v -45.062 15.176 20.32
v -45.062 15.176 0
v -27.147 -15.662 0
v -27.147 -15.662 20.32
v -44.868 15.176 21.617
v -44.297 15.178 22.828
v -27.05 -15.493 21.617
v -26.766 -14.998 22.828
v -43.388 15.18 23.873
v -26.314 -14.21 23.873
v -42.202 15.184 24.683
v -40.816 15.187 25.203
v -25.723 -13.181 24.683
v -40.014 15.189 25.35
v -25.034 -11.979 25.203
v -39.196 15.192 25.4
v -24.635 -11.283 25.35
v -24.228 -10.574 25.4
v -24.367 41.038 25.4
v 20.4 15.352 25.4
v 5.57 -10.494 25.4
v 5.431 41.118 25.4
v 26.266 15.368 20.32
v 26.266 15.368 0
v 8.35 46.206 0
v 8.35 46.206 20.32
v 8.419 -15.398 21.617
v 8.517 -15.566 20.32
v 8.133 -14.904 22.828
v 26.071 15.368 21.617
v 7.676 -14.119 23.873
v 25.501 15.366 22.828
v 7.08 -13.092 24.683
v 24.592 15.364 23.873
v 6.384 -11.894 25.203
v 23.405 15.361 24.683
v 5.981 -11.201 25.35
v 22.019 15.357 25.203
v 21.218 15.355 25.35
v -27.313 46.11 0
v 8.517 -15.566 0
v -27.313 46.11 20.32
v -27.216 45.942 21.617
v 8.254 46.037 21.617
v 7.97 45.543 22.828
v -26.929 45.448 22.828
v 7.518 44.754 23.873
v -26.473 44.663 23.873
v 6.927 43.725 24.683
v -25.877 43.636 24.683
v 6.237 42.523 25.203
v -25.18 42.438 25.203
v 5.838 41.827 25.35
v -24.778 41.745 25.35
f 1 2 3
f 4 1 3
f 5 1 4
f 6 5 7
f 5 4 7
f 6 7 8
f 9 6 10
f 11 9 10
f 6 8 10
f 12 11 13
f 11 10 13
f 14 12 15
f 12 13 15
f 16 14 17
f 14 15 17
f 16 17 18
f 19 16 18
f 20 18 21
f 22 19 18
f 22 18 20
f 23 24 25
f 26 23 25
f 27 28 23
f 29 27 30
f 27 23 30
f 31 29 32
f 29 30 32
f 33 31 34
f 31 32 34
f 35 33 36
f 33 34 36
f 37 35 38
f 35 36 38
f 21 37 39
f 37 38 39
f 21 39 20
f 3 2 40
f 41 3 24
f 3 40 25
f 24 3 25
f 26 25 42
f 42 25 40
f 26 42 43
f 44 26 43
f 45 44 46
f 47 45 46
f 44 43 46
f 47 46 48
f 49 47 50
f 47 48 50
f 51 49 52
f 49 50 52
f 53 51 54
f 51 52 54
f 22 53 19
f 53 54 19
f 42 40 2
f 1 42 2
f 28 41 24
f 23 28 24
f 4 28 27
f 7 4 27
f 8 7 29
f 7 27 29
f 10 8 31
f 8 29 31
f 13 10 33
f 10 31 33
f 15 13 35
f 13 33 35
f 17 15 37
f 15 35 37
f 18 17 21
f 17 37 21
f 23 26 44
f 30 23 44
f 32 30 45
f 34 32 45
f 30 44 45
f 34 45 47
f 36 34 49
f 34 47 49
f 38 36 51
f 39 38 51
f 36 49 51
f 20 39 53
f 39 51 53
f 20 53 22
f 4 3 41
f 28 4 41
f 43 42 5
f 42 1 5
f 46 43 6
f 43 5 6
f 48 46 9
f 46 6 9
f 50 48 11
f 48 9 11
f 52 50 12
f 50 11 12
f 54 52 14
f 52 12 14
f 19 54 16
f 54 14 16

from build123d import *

# Parameters (mm, degrees)
F1_DEPTH = 25.4
F2_R     = 5.08


with BuildPart() as f1:
    # F0 (on Top) → F1 (new body)
    with BuildSketch(Plane.XY):
        Polygon((-27.146846, -15.661945), (8.517105, -15.565745), (26.265768, 15.368244), (8.35048, 46.206031), (-27.313471, 46.10983), (-45.062134, 15.175842), align=None)
    extrude(amount=F1_DEPTH)

    # F2
    f2_edges = [f1.edges().sort_by_distance(p)[0] for p in [
        (-36.187802, 30.642836, 25.4),
        (-9.481495, 46.15793, 25.4),
        (17.308124, 30.787137, 25.4),
        (17.391437, -0.098751, 25.4),
        (-9.31487, -15.613845, 25.4),
        (-36.10449, -0.243052, 25.4),
    ]]
    fillet(f2_edges, radius=F2_R)


solid = f1.part
